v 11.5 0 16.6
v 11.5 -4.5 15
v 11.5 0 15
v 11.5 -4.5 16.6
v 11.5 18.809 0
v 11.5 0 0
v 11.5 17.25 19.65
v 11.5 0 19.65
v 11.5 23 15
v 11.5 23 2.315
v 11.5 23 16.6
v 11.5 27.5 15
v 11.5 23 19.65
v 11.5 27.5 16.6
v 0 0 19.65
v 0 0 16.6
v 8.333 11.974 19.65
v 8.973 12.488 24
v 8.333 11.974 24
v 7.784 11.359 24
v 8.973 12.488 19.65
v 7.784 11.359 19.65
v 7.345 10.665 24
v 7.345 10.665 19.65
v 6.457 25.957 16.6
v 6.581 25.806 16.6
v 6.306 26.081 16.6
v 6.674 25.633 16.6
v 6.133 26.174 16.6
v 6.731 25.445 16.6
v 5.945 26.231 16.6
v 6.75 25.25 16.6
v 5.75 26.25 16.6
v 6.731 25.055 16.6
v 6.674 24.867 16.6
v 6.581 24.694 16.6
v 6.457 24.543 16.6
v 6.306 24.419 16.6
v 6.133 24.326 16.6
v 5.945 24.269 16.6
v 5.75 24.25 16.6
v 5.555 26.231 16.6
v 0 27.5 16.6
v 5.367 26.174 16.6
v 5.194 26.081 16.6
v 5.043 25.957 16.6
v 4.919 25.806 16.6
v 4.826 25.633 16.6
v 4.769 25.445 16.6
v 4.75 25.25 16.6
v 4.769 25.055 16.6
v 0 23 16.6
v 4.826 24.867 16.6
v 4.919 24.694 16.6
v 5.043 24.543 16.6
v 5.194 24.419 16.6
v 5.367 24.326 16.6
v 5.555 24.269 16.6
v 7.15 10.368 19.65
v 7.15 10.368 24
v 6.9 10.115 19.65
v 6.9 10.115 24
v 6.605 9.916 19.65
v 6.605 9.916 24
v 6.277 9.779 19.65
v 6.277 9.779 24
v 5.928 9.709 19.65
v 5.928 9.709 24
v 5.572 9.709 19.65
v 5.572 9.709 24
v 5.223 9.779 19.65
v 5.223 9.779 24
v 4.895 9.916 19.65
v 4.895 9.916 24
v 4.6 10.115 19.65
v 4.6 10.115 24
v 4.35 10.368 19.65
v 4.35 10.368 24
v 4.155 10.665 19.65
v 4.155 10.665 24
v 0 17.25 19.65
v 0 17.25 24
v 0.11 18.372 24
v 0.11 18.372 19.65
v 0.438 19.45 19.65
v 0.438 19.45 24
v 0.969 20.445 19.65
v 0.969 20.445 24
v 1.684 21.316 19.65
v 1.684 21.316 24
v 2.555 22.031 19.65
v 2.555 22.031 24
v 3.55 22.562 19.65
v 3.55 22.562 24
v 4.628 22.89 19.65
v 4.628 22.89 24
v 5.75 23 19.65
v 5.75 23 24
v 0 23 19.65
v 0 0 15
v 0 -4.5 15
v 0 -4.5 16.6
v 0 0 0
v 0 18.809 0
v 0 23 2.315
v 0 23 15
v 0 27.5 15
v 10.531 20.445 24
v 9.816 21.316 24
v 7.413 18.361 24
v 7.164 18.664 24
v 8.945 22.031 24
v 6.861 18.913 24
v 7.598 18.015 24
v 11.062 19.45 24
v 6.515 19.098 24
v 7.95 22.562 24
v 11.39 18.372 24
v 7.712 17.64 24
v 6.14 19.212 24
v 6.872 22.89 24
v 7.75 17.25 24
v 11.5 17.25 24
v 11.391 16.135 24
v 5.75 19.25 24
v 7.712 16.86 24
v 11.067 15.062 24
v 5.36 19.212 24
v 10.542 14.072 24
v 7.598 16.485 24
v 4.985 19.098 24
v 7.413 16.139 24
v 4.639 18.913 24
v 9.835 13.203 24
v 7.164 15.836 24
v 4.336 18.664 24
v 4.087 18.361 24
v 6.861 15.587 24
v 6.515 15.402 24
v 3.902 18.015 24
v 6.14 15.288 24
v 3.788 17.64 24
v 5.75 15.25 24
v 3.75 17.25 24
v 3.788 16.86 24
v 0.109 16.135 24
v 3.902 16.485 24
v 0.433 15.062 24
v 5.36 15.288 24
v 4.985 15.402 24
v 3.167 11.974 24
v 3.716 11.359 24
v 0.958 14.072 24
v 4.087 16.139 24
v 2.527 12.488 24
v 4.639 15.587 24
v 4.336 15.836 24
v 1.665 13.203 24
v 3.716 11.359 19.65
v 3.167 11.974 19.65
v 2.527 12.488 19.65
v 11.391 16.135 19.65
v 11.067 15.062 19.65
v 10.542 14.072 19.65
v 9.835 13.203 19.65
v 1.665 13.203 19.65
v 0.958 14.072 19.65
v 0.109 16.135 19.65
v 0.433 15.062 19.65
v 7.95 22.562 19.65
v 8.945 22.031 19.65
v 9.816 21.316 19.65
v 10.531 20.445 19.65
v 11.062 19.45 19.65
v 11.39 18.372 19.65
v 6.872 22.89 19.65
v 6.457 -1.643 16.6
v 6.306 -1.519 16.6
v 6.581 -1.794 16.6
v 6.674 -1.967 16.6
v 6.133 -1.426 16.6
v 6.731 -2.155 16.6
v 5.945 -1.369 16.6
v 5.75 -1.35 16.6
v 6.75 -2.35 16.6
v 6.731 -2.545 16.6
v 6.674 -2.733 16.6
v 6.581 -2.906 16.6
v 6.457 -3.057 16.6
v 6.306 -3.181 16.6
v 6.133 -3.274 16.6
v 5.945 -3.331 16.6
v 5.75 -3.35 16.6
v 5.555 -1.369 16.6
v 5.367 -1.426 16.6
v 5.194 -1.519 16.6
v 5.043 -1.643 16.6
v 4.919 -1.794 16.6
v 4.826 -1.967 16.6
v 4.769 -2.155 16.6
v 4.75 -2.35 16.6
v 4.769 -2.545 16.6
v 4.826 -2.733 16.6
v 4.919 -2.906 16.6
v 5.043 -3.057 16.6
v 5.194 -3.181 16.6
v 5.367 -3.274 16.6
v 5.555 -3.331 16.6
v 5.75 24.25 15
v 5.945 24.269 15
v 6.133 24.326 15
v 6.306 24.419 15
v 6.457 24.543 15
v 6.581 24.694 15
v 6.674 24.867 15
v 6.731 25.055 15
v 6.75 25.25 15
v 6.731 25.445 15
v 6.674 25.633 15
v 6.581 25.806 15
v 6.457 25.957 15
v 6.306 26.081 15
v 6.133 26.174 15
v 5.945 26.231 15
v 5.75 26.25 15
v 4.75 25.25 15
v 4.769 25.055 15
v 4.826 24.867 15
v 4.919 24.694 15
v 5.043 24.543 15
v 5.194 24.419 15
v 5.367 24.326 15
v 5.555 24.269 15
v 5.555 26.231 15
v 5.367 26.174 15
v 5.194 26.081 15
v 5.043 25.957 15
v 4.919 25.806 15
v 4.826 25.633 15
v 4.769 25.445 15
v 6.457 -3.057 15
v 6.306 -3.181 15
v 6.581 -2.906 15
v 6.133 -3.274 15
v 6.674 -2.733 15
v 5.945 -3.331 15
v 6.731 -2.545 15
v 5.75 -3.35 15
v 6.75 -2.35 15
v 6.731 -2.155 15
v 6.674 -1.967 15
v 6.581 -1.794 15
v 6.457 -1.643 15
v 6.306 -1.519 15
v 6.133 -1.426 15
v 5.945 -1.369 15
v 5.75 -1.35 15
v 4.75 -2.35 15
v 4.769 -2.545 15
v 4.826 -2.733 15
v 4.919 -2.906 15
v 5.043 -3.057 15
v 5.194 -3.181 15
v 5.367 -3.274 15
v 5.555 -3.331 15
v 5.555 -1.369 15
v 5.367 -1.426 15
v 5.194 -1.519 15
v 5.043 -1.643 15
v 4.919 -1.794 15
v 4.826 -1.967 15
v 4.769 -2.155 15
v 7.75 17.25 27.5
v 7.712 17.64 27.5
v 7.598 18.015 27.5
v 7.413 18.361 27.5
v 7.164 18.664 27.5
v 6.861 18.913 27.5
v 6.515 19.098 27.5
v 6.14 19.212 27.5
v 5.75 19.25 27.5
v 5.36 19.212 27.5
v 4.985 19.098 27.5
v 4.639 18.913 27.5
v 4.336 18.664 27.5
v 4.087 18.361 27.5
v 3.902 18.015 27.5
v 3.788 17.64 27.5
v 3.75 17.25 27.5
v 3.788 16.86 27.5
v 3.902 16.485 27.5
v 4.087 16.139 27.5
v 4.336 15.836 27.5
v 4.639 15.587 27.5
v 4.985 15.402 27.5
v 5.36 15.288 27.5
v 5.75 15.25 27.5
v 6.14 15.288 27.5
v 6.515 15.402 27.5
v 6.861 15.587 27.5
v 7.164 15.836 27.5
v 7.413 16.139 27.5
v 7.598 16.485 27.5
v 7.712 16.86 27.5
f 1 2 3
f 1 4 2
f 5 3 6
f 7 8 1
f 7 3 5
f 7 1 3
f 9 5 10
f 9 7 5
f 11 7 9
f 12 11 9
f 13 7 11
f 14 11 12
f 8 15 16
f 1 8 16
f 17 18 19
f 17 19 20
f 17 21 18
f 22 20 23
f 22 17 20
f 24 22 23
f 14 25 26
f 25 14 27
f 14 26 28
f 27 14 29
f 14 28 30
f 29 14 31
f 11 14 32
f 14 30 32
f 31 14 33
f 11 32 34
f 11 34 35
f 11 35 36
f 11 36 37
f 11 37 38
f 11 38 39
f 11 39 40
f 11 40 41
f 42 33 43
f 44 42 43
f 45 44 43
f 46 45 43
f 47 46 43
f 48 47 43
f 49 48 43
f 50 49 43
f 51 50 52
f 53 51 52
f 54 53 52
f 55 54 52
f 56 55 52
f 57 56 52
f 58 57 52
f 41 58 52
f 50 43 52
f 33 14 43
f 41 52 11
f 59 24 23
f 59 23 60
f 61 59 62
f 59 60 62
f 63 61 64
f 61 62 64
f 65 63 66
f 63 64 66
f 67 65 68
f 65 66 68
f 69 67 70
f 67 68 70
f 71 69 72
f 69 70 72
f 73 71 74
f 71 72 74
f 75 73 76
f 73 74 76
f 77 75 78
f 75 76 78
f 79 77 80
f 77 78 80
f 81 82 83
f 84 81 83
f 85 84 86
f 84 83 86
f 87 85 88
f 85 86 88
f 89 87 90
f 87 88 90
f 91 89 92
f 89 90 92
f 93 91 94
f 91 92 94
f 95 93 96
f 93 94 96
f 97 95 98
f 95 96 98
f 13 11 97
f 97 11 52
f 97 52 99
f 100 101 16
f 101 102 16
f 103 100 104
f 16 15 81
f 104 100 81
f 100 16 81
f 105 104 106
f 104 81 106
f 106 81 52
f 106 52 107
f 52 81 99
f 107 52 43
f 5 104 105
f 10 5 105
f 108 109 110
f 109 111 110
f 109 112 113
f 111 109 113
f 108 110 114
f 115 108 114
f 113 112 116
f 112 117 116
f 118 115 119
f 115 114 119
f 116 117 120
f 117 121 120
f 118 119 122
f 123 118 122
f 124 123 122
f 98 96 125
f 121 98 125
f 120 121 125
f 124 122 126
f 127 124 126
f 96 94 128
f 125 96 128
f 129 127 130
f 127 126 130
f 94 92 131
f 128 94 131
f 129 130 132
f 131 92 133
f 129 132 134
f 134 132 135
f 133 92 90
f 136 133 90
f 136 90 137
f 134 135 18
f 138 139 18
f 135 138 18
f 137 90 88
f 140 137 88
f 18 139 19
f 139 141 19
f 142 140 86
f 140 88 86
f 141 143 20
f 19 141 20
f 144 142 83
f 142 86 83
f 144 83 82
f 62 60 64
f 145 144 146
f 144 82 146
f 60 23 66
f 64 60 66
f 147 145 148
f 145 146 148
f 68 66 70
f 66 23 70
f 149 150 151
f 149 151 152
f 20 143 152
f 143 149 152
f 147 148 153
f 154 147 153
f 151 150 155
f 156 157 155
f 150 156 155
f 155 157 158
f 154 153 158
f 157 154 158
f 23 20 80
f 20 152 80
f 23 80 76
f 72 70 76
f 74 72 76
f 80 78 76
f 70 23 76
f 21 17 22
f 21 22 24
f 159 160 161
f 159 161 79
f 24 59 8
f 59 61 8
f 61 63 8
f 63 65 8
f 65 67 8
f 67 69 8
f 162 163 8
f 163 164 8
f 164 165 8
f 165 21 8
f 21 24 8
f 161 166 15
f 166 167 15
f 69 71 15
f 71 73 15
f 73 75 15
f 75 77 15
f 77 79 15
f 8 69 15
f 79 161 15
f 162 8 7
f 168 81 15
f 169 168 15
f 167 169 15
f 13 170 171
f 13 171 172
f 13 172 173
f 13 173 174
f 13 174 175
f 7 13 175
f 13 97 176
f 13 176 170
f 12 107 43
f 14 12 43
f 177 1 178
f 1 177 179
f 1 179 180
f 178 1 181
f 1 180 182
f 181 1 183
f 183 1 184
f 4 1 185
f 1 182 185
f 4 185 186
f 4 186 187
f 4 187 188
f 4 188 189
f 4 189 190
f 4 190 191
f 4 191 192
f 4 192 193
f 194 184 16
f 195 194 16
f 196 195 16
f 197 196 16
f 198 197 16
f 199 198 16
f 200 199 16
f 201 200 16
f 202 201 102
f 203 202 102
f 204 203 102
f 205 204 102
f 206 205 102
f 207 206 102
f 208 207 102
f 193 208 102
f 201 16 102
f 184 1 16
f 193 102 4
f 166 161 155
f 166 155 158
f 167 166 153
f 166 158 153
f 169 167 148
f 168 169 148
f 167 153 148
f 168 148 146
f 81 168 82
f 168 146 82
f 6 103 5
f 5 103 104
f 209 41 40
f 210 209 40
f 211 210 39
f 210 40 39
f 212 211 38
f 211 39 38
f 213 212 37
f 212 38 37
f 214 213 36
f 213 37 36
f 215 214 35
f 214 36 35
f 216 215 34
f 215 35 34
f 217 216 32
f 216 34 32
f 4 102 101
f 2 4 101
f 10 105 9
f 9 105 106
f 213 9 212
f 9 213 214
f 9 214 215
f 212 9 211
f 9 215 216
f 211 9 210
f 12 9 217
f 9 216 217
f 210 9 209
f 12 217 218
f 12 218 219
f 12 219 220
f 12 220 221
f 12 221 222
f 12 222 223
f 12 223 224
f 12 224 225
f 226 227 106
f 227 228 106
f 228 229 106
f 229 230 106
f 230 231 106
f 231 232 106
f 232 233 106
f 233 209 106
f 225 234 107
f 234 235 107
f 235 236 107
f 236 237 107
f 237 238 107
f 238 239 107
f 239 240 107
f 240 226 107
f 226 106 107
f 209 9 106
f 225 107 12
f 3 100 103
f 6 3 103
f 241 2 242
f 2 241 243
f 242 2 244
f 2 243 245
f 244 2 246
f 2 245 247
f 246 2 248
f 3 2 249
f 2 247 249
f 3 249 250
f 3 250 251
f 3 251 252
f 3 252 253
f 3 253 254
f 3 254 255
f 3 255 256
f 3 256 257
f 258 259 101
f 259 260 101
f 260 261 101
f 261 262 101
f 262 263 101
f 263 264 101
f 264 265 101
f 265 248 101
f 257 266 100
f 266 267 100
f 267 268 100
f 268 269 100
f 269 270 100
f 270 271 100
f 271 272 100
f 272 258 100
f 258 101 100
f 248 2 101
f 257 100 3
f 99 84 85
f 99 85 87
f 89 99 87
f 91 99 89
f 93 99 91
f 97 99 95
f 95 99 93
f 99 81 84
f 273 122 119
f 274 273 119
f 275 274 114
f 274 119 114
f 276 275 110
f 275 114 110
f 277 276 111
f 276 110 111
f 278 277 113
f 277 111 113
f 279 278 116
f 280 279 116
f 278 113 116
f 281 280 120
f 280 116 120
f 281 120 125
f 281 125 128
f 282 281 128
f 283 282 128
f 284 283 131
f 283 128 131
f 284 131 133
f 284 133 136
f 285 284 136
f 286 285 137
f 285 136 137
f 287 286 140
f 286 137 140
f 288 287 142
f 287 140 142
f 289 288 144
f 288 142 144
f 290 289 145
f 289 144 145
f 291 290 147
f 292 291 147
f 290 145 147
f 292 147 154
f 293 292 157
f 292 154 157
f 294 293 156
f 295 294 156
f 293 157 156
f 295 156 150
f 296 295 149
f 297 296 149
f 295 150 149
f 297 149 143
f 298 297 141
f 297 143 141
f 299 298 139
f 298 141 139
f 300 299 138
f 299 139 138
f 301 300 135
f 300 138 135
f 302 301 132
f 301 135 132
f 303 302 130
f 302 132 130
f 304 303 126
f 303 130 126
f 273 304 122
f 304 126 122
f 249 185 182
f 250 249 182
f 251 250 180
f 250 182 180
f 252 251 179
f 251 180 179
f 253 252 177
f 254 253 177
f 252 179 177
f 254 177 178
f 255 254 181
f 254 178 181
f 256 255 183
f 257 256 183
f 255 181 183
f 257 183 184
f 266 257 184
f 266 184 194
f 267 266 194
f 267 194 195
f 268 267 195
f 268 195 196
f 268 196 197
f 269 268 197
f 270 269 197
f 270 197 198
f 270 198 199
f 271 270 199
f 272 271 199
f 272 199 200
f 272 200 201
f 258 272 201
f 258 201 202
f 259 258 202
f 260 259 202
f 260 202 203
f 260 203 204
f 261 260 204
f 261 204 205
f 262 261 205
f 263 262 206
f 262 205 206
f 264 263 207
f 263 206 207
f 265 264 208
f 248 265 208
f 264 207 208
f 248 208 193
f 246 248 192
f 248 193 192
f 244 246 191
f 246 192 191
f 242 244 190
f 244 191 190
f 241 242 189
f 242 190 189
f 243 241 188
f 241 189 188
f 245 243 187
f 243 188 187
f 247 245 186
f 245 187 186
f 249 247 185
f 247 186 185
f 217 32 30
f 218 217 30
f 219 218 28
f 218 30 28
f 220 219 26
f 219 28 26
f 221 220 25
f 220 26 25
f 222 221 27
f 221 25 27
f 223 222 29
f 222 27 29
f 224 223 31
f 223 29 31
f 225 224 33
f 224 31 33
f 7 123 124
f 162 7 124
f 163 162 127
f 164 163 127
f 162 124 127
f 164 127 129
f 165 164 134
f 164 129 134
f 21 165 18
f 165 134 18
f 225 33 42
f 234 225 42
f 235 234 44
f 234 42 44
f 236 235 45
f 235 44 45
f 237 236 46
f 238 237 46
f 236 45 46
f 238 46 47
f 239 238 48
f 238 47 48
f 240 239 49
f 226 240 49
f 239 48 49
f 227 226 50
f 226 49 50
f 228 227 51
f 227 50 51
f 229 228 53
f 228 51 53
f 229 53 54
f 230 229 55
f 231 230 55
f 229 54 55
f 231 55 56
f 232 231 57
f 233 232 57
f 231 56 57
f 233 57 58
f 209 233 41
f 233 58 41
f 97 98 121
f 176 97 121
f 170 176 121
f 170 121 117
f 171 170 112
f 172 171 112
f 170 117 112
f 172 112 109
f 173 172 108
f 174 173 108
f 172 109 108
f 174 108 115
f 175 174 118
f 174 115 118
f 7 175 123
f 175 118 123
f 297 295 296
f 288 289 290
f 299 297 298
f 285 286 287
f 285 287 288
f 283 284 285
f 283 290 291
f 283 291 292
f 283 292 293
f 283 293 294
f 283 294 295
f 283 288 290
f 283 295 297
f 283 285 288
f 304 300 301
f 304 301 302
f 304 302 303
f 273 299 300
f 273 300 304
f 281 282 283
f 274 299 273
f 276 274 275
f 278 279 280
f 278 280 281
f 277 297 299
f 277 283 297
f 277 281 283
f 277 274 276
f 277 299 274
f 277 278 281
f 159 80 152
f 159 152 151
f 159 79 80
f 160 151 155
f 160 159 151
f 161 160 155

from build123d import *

# Parameters (mm, degrees)
F1_DEPTH = 11.5
F3_DEPTH = 4.35
F4_R     = 5
F5_R     = 1
F6_DEPTH = 25
F7_R     = 2
F8_DEPTH = 3.5


with BuildPart() as f1:
    # F0 (on Right) → F1 (new body)
    with BuildSketch(Plane.YZ):
        Polygon((0, 15), (0, 0), (18.8086195217, 0), (23, 2.3149361368), (23, 15), (27.5, 15), (27.5, 16.6), (23, 16.6), (23, 24), (5, 24), (5, 19.65), (0, 19.65), (0, 16.6), (-4.5, 16.6), (-4.5, 15), align=None)
    extrude(amount=F1_DEPTH)

    # F2 (on face) → F3 (cut, through all)
    with BuildSketch(Plane.XY.offset(24)):
        with BuildLine():
            Line((11.5, 5), (11.5, 17.25))
            ThreePointArc((11.5, 17.25), (10.4021463443, 13.8706458618), (7.5278141248, 11.7817391304))
            ThreePointArc((7.5278141248, 11.7817391304), (7.5444449594, 11.6413056534), (7.55, 11.5))
            ThreePointArc((7.55, 11.5), (5.6086943466, 9.7055550406), (3.9721858752, 11.7817391304))
            ThreePointArc((3.9721858752, 11.7817391304), (1.0978536557, 13.8706458618), (0, 17.25))
            Line((0, 17.25), (0, 5))
            Line((0, 5), (11.5, 5))
        make_face()
        with BuildLine():
            ThreePointArc((5.75, 23), (9.8158639918, 21.3158639918), (11.5, 17.25))
            Line((11.5, 17.25), (11.5, 23))
            Line((11.5, 23), (5.75, 23))
        make_face()
        with BuildLine():
            ThreePointArc((0, 17.25), (1.6841360082, 21.3158639918), (5.75, 23))
            Line((5.75, 23), (0, 23))
            Line((0, 23), (0, 17.25))
        make_face()
    extrude(amount=-F3_DEPTH, mode=Mode.SUBTRACT)

    # F4
    f4_edges = [f1.edges().sort_by_distance(p)[0] for p in [
        (7.527814, 11.781739, 21.825),
        (3.972186, 11.781739, 21.825),
    ]]
    fillet(f4_edges, radius=F4_R)

    # F5 (on face) → F6 (cut)
    with BuildSketch(Plane.XY.offset(16.6)):
        with BuildLine():
            ThreePointArc((5.75, 24.25), (6.4571067812, 24.5428932188), (6.75, 25.25))
            ThreePointArc((6.75, 25.25), (6.4571067812, 25.9571067812), (5.75, 26.25))
            Line((5.75, 26.25), (5.75, 24.25))
        make_face()
        with BuildLine():
            Line((5.75, 24.25), (5.75, 26.25))
            ThreePointArc((5.75, 26.25), (4.75, 25.25), (5.75, 24.25))
        make_face()
        with Locations((5.75, -2.35)):
            Circle(F5_R)
    extrude(amount=-F6_DEPTH, mode=Mode.SUBTRACT)

    # F7 (on face) → F8 (join)
    with BuildSketch(Plane.XY.offset(24)):
        with Locations((5.75, 17.25)):
            Circle(F7_R)
    extrude(amount=F8_DEPTH)


solid = f1.part
